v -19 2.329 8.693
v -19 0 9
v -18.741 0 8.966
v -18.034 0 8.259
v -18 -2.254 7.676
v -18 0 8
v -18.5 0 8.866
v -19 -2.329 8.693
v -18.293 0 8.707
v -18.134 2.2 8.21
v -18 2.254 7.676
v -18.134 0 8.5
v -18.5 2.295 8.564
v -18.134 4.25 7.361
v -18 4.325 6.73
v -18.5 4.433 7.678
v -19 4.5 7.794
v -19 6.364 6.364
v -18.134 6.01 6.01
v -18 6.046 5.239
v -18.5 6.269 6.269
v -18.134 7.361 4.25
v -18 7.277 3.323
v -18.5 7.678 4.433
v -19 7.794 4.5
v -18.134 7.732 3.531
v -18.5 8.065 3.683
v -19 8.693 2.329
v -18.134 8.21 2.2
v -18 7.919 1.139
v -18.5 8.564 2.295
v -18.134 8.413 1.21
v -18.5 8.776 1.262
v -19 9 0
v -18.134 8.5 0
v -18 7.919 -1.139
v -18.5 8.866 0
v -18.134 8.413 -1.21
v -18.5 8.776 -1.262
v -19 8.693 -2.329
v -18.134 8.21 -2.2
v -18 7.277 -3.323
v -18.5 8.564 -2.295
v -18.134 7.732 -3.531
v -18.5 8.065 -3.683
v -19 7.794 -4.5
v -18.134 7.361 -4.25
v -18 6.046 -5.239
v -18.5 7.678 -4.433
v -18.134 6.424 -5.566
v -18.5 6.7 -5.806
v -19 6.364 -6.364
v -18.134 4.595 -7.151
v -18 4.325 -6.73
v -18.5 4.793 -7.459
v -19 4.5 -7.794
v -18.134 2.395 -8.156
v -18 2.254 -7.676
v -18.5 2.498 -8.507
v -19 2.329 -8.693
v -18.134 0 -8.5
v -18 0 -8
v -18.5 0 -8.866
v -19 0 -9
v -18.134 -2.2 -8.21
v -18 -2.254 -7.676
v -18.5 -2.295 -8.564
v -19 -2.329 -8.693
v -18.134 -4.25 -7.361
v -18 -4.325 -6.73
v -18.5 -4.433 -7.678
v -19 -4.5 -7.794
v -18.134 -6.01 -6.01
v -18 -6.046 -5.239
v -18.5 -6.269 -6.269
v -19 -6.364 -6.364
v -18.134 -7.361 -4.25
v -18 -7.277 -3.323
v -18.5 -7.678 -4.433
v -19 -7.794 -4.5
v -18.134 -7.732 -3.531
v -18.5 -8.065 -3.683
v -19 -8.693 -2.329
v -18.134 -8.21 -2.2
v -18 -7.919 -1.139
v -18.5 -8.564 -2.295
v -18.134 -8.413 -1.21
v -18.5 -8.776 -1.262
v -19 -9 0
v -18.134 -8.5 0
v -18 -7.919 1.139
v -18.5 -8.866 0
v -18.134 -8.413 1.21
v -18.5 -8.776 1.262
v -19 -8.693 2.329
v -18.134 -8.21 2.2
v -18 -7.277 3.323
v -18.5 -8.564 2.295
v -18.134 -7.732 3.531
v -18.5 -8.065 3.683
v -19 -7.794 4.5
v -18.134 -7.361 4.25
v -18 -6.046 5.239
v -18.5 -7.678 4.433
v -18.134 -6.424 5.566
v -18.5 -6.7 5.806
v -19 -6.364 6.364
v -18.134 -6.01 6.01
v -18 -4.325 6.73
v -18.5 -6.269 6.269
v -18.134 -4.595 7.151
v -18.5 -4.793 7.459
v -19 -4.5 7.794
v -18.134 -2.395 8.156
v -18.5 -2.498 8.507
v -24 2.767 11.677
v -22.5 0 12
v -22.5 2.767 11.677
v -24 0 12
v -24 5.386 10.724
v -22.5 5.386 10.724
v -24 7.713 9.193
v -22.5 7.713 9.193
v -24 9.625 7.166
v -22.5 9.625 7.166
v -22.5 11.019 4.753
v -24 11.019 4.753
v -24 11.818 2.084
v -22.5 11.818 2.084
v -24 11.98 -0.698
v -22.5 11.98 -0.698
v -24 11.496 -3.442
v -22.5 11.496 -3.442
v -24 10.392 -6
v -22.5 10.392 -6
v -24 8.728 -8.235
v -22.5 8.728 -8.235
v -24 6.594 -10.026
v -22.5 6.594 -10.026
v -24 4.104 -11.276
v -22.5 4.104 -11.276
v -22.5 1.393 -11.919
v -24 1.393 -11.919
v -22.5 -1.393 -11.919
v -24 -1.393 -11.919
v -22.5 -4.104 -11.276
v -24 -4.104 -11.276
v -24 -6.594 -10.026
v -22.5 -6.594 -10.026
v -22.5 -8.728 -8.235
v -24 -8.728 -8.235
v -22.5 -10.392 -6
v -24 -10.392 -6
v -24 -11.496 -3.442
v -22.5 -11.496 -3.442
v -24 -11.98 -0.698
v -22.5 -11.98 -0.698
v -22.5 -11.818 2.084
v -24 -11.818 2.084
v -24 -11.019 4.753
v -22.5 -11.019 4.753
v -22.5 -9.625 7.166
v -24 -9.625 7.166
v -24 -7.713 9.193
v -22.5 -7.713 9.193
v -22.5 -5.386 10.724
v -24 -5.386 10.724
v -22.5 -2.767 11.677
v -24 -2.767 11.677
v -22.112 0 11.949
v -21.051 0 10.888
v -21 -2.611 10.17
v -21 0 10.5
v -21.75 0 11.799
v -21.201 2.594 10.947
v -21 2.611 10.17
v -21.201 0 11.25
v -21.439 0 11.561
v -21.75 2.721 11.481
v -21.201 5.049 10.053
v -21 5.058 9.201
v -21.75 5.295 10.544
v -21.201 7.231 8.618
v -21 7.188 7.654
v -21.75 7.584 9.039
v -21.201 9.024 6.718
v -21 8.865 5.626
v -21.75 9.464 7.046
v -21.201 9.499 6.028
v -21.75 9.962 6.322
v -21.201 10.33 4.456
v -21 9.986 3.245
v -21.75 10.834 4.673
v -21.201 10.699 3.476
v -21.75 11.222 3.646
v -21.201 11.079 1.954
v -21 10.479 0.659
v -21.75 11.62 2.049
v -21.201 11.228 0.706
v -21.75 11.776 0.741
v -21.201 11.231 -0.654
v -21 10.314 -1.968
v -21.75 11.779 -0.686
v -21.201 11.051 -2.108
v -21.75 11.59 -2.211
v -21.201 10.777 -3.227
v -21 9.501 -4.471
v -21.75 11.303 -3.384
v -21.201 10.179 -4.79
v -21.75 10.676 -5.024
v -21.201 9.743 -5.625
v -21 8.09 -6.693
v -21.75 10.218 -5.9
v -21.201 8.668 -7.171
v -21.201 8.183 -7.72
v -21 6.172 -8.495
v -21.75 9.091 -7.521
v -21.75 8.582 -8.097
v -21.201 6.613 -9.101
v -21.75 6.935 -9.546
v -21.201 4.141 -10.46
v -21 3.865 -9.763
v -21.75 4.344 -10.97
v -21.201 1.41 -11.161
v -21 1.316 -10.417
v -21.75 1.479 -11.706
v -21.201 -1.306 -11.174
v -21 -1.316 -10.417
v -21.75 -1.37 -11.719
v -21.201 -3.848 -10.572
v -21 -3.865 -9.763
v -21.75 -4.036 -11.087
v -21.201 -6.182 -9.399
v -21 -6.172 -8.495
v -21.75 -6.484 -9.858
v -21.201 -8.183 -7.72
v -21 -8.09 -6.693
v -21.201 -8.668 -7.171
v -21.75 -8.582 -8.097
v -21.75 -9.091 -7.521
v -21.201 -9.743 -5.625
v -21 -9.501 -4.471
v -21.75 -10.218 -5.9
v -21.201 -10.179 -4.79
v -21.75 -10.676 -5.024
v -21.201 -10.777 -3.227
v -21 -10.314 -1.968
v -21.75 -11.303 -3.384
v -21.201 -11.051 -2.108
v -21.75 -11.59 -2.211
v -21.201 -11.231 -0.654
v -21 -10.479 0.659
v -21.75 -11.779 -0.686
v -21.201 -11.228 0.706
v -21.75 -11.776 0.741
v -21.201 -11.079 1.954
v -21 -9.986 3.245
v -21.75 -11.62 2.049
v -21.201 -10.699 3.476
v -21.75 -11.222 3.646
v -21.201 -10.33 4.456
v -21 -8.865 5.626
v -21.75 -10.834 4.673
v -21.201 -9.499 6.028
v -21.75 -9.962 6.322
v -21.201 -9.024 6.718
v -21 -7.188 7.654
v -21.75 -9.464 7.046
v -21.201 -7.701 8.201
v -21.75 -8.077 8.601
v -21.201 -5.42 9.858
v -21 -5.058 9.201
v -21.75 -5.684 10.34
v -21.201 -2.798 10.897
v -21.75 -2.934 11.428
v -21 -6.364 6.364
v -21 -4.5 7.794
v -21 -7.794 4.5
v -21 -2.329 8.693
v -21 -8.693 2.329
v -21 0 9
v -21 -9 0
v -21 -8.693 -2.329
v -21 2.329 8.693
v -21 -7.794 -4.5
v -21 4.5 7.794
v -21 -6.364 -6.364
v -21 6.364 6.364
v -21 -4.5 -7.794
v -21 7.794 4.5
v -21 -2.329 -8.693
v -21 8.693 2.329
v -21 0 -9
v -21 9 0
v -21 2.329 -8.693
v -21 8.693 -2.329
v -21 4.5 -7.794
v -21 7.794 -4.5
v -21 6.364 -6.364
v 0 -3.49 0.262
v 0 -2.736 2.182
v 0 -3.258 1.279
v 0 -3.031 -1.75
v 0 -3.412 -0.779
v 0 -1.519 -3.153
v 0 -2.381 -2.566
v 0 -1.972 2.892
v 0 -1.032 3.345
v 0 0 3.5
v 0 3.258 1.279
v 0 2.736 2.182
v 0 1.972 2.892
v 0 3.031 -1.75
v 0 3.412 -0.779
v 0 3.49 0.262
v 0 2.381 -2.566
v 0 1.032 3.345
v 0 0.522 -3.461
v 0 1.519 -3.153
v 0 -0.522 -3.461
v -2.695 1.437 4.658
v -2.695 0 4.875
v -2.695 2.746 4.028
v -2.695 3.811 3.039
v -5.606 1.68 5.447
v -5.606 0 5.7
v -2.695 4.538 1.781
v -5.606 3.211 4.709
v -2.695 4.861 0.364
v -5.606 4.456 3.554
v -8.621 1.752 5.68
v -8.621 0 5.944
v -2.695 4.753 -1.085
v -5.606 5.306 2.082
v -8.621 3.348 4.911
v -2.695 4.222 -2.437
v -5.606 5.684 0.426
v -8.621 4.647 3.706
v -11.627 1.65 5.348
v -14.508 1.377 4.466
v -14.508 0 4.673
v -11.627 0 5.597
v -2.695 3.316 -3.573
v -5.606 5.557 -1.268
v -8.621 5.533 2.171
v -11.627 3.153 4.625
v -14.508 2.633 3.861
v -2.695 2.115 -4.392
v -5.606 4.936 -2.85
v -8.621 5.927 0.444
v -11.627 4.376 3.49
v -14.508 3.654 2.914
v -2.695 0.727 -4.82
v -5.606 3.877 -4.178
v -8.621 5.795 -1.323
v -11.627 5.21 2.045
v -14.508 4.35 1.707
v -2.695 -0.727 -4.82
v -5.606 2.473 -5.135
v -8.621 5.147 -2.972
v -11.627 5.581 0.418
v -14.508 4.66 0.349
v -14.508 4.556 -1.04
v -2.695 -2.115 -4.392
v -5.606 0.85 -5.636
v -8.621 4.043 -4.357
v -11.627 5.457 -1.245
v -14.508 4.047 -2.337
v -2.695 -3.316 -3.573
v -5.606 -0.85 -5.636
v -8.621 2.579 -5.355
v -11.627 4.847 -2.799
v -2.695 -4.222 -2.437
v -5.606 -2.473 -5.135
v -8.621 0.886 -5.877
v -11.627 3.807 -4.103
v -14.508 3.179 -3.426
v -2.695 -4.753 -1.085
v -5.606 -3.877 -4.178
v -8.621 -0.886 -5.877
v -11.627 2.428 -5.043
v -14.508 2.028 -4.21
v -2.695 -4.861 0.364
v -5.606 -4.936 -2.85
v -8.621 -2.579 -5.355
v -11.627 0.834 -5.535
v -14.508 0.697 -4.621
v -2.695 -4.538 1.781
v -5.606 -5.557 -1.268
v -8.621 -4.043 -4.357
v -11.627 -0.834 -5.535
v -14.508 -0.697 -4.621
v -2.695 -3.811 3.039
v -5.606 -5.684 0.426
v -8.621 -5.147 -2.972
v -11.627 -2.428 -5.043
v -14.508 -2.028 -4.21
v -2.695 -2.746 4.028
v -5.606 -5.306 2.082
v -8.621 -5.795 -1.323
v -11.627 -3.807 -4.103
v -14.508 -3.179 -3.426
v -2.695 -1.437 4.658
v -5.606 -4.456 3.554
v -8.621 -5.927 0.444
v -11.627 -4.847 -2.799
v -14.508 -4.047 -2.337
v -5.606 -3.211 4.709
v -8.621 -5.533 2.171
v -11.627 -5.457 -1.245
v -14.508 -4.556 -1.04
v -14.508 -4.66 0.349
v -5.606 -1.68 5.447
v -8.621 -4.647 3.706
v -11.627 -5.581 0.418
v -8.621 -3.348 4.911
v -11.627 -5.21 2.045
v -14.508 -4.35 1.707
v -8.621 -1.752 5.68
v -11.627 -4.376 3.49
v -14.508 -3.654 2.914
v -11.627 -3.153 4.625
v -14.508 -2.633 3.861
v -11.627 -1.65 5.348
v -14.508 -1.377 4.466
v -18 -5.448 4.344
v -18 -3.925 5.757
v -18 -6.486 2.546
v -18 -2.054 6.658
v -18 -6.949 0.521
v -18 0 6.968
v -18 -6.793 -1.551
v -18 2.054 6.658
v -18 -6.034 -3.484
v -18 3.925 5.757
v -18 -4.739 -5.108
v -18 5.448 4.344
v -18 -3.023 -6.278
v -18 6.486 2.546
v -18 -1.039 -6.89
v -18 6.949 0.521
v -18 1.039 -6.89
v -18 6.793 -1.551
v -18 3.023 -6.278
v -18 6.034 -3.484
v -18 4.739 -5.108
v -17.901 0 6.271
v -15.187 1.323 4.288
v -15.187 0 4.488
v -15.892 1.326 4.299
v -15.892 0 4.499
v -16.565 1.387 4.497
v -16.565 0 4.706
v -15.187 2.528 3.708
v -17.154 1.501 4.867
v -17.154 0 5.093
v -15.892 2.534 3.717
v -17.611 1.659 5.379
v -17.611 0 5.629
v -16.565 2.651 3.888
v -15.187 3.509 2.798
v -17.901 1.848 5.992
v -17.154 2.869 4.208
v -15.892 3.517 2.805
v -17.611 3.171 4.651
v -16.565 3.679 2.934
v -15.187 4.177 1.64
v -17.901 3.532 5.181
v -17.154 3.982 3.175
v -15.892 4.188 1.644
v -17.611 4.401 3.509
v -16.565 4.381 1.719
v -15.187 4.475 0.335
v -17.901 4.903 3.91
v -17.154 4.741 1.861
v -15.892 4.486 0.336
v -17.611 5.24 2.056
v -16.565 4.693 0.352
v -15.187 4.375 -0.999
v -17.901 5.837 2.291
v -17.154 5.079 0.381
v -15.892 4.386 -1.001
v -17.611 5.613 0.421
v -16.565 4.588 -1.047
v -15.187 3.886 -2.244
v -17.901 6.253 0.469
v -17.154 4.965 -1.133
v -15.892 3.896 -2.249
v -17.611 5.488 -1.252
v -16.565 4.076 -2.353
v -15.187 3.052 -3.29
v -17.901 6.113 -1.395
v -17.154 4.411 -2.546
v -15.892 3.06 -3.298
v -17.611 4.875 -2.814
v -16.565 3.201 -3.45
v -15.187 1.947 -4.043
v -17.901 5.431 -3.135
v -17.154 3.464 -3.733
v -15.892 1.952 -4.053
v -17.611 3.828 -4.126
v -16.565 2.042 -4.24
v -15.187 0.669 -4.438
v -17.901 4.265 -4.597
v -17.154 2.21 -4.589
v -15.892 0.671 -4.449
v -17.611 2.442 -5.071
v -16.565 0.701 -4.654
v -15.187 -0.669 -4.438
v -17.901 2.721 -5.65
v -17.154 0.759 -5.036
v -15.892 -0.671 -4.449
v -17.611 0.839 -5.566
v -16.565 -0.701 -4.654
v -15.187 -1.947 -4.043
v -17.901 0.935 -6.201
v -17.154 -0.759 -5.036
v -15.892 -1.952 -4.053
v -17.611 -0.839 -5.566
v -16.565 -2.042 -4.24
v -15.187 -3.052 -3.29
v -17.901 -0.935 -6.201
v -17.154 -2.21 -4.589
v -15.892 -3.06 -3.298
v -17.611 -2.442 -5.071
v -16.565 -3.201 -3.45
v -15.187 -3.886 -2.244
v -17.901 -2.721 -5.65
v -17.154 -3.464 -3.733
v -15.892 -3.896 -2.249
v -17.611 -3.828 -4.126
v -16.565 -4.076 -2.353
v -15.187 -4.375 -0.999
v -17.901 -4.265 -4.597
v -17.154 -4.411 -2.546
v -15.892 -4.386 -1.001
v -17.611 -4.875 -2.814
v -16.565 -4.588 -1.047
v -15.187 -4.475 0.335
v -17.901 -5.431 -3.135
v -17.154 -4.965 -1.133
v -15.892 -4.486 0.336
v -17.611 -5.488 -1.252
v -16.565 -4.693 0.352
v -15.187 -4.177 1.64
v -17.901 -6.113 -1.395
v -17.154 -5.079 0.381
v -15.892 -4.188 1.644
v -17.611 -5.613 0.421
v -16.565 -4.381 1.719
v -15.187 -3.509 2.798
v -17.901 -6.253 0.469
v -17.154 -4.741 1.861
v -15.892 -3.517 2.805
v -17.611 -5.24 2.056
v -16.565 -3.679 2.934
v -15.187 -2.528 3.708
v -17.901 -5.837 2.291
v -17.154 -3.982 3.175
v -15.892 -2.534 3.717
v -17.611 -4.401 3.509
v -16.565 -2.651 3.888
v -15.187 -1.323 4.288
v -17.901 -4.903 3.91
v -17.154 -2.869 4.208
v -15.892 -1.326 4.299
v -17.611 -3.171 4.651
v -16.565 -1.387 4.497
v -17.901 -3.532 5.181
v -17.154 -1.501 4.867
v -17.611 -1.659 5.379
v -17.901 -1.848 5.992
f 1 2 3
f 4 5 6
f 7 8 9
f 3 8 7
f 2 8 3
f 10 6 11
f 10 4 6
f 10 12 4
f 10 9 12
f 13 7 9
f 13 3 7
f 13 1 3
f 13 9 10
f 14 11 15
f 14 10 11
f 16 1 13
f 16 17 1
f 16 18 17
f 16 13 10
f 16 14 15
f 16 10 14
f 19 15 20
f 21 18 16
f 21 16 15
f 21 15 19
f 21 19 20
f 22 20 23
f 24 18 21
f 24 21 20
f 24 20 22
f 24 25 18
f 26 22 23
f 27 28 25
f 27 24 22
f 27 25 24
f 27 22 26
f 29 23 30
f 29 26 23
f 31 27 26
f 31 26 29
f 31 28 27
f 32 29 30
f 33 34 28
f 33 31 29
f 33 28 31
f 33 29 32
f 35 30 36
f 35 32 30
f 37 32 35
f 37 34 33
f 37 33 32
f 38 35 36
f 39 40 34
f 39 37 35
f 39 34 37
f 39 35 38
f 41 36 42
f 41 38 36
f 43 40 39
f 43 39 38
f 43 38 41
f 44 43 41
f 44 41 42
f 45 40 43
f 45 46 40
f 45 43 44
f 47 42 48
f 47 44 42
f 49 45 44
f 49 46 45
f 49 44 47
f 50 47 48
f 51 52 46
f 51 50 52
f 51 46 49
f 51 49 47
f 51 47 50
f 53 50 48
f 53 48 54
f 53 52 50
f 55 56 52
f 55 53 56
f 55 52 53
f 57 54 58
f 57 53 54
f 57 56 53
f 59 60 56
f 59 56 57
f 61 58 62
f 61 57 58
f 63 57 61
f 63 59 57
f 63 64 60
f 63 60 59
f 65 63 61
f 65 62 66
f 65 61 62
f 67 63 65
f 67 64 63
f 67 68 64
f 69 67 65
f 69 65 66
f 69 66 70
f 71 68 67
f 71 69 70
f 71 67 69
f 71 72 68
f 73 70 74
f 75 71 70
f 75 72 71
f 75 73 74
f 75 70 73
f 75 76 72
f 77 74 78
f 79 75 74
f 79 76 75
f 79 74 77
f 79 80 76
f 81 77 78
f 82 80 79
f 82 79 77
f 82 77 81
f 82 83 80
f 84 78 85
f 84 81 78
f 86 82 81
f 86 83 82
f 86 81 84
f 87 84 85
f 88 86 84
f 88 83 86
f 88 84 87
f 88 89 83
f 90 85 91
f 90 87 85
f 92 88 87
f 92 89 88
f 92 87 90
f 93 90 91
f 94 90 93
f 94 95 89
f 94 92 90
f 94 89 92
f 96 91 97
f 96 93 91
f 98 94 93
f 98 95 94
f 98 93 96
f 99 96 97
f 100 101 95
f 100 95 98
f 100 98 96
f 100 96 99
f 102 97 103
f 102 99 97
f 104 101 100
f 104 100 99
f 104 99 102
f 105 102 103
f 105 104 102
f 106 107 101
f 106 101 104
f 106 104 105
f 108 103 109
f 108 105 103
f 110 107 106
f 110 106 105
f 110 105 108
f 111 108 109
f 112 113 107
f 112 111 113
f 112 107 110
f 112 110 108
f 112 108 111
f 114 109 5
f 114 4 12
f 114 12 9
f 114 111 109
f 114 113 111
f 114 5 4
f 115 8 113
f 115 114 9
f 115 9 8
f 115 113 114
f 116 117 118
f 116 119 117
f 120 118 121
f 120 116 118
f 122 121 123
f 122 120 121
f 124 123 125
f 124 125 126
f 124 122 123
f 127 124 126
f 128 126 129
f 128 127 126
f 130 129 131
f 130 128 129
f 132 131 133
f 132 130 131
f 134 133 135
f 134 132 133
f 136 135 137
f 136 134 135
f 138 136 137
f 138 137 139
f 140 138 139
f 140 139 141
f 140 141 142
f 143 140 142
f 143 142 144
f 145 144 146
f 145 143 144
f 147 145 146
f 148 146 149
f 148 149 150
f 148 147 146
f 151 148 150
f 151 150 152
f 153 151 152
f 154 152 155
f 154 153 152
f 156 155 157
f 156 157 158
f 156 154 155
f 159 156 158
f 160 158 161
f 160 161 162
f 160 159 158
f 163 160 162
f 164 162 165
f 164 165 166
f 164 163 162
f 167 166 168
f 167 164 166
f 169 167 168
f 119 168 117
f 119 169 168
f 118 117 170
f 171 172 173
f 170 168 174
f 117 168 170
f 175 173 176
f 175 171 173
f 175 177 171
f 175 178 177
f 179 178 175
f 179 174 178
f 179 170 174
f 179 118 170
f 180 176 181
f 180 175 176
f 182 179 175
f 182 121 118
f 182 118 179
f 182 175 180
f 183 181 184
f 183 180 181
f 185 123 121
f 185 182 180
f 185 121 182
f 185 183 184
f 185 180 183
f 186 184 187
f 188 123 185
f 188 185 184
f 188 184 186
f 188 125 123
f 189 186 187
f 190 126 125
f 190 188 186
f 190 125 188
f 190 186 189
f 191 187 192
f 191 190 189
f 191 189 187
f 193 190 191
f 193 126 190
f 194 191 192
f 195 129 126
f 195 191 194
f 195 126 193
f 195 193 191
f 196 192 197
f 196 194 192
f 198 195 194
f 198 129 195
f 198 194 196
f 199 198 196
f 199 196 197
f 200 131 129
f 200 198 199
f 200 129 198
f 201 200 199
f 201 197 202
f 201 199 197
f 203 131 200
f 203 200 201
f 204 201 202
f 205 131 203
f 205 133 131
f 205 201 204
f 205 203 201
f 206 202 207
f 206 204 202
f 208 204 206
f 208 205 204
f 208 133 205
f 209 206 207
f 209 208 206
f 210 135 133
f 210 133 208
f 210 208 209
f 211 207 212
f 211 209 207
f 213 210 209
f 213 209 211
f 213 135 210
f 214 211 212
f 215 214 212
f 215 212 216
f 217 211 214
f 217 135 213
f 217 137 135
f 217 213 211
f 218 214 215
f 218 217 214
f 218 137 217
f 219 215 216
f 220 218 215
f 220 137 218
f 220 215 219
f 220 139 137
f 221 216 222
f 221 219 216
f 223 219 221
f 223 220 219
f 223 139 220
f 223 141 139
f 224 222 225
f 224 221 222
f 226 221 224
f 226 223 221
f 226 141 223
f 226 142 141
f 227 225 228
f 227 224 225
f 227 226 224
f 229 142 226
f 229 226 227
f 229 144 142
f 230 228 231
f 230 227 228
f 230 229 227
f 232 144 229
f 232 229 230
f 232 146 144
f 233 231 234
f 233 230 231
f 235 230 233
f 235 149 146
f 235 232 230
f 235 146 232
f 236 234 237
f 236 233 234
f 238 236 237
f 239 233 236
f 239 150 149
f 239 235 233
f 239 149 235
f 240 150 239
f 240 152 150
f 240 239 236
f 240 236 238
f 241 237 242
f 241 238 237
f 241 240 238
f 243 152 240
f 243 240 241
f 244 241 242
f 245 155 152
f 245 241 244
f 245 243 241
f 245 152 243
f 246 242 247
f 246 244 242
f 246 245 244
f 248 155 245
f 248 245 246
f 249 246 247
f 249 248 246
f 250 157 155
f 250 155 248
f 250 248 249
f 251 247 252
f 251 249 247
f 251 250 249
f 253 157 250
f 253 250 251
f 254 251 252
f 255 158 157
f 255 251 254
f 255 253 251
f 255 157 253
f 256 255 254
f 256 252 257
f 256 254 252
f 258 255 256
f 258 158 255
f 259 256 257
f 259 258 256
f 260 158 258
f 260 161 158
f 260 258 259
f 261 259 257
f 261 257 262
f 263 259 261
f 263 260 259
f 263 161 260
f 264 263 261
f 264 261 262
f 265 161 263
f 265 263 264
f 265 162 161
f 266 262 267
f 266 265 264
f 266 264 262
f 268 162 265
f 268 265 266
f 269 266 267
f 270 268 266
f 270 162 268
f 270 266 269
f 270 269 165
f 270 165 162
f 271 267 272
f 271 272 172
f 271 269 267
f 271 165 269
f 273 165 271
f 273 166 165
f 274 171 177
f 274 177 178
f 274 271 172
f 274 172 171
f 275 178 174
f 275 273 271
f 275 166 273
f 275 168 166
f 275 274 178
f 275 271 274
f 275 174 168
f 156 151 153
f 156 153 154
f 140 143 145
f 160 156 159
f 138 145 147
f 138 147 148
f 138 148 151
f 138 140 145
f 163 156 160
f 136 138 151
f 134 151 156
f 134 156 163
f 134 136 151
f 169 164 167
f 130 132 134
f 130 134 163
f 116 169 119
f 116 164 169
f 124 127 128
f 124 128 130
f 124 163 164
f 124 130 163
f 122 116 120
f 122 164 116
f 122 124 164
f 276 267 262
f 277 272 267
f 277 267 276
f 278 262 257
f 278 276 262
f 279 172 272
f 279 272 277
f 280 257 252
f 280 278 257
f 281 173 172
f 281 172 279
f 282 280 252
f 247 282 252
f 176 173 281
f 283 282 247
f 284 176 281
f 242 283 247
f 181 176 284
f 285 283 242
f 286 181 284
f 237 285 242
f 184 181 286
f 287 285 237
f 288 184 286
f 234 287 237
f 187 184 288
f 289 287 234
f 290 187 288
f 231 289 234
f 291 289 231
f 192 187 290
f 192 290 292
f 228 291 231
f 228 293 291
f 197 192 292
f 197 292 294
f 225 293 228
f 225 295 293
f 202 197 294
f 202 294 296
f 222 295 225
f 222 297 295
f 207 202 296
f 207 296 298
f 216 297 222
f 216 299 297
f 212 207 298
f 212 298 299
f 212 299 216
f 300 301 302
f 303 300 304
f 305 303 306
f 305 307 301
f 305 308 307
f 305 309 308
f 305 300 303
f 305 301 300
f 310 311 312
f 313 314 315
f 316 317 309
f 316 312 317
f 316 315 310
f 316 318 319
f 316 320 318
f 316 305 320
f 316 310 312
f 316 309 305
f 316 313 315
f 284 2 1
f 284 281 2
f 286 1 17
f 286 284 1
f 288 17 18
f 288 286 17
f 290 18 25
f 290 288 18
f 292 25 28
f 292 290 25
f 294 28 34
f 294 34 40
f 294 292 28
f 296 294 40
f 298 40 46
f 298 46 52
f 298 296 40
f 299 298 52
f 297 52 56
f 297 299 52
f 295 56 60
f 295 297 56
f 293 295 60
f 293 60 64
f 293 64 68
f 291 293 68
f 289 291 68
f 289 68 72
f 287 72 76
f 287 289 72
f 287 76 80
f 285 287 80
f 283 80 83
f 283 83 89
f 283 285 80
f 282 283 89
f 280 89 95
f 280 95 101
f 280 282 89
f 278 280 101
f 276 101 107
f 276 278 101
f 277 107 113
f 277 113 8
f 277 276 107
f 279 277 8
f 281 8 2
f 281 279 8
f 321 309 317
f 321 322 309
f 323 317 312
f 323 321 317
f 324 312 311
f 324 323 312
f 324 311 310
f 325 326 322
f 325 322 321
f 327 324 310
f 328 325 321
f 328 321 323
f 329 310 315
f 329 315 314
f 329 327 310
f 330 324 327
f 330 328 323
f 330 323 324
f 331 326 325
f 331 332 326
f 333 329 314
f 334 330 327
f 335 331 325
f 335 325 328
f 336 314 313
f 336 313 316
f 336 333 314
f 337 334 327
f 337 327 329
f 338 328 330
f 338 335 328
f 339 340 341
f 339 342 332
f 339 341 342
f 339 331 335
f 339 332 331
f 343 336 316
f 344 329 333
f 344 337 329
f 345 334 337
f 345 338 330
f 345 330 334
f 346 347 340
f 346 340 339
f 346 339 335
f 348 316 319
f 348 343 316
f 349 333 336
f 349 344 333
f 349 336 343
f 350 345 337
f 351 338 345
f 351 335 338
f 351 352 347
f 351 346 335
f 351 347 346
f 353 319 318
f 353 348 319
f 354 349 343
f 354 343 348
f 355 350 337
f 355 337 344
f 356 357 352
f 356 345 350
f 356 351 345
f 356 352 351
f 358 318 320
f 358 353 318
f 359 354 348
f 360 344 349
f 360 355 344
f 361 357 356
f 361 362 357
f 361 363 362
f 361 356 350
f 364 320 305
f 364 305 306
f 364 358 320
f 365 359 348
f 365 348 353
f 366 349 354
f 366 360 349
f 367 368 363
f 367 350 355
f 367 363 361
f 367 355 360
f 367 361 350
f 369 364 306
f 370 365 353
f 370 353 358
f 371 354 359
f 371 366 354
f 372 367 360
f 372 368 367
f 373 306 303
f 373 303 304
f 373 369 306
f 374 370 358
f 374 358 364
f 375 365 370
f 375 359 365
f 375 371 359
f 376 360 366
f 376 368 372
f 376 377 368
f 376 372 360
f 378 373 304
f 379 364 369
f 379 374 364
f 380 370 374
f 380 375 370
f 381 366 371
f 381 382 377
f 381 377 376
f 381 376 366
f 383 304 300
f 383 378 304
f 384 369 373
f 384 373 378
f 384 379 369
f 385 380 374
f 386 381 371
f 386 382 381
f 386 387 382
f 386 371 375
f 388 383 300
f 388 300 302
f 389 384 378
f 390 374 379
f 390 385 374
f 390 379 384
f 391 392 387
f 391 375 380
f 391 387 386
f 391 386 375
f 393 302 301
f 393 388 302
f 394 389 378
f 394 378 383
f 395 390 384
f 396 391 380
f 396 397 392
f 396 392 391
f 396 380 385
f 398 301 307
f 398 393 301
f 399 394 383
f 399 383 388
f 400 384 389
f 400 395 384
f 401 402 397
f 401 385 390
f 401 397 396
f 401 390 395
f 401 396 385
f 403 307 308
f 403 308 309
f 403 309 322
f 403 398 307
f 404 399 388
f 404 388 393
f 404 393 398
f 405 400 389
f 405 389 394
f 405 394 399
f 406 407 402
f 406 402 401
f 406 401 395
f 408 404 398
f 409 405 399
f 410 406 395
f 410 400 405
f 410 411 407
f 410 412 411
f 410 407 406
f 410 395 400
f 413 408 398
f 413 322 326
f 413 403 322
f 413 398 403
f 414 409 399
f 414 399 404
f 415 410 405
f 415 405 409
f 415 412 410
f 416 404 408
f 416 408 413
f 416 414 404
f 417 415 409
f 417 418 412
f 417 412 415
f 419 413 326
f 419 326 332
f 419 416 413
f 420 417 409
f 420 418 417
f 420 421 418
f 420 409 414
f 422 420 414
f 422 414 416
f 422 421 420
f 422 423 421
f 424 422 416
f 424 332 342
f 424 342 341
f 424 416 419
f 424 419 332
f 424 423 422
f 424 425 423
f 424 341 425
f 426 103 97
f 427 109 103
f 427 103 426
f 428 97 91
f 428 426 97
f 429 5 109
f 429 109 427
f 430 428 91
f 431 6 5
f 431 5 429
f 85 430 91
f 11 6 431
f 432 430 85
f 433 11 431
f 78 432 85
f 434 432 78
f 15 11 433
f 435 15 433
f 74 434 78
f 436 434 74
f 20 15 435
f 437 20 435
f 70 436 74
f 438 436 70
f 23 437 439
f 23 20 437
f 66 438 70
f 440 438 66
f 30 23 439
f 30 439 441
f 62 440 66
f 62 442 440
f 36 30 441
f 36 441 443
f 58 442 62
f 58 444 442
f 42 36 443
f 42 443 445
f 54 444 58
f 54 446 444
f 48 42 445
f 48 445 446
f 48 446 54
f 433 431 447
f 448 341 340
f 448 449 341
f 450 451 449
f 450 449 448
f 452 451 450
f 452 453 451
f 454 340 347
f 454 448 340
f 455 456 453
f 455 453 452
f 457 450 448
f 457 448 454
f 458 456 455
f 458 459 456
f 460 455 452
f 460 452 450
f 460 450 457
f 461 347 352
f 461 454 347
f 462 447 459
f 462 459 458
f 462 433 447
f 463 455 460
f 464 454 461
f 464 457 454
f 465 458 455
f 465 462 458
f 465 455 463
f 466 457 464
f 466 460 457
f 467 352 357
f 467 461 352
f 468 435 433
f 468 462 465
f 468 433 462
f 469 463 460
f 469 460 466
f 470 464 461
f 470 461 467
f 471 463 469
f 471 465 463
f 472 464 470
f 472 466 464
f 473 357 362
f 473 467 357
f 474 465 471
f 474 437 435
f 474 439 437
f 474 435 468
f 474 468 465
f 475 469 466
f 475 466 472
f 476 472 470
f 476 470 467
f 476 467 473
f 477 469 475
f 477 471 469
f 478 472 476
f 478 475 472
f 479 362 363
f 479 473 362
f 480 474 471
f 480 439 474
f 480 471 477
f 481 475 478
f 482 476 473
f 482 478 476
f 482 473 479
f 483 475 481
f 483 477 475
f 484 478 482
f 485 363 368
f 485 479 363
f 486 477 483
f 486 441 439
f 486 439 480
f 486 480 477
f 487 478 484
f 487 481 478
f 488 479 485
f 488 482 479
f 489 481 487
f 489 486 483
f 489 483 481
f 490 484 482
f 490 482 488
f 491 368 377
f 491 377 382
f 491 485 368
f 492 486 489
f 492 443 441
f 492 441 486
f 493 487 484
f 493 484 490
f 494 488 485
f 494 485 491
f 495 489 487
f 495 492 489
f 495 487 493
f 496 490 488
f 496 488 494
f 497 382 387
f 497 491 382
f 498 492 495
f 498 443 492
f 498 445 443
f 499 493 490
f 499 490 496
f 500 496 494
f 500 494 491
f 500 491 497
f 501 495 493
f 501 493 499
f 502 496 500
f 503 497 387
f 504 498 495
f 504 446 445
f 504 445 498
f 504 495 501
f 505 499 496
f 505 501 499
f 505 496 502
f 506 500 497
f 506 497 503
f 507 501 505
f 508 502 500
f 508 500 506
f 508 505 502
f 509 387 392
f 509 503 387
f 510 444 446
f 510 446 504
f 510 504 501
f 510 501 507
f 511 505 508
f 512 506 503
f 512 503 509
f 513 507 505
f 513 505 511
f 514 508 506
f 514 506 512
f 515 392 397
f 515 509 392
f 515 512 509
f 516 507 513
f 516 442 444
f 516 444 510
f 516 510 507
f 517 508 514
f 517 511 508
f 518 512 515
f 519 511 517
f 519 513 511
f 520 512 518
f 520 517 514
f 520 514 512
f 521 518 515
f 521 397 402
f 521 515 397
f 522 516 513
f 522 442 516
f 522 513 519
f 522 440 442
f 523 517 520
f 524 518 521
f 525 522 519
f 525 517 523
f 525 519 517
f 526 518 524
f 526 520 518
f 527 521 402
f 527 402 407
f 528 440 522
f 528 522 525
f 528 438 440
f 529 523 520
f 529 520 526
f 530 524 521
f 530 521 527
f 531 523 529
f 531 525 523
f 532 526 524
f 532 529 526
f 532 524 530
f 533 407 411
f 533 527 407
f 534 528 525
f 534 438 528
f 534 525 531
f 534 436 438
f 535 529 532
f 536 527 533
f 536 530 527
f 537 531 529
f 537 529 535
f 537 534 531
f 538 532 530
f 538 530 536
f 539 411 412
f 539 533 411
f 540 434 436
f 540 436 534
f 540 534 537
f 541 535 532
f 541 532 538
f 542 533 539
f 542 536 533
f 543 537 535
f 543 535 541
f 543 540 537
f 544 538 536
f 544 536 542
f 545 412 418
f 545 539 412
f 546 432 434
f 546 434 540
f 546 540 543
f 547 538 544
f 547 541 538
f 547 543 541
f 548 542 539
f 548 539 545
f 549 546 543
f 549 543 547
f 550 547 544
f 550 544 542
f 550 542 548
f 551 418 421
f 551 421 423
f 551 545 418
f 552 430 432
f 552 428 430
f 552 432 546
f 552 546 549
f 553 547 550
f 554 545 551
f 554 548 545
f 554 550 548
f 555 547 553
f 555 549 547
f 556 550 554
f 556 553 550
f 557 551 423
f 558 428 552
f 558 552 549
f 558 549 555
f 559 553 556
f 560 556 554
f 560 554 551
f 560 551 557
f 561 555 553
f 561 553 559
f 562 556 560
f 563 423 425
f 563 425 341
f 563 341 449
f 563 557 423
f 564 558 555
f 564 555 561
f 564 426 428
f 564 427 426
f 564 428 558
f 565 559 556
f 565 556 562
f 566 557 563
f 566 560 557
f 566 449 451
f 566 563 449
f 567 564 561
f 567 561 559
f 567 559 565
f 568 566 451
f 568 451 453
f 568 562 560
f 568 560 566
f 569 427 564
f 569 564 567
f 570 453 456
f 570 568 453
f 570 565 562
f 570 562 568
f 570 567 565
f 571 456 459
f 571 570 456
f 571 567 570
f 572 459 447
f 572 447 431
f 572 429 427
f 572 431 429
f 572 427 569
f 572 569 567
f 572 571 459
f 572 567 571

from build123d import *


with BuildPart() as f1:
    # F0 (on Front) → F1 (revolve)
    with BuildSketch(Plane.XZ):
        with BuildLine():
            Line((-24, 0), (0, 0))
            Line((0, 0), (0, 3.5))
            ThreePointArc((0, 3.5), (-7.107681, 5.895494), (-14.507932, 4.673281))
            ThreePointArc((-14.507932, 4.673281), (-16.872922, 4.878736), (-18, 6.968014))
            Line((-18, 6.968014), (-18, 8))
            ThreePointArc((-18, 8), (-18.292893, 8.707107), (-19, 9))
            Line((-19, 9), (-21, 9))
            Line((-21, 9), (-21, 10.5))
            ThreePointArc((-21, 10.5), (-21.43934, 11.56066), (-22.5, 12))
            Line((-22.5, 12), (-24, 12))
            Line((-24, 12), (-24, 0))
        make_face()
    revolve(axis=Axis((-12, 0, 0), (-1, 0, 0)))


solid = f1.part
